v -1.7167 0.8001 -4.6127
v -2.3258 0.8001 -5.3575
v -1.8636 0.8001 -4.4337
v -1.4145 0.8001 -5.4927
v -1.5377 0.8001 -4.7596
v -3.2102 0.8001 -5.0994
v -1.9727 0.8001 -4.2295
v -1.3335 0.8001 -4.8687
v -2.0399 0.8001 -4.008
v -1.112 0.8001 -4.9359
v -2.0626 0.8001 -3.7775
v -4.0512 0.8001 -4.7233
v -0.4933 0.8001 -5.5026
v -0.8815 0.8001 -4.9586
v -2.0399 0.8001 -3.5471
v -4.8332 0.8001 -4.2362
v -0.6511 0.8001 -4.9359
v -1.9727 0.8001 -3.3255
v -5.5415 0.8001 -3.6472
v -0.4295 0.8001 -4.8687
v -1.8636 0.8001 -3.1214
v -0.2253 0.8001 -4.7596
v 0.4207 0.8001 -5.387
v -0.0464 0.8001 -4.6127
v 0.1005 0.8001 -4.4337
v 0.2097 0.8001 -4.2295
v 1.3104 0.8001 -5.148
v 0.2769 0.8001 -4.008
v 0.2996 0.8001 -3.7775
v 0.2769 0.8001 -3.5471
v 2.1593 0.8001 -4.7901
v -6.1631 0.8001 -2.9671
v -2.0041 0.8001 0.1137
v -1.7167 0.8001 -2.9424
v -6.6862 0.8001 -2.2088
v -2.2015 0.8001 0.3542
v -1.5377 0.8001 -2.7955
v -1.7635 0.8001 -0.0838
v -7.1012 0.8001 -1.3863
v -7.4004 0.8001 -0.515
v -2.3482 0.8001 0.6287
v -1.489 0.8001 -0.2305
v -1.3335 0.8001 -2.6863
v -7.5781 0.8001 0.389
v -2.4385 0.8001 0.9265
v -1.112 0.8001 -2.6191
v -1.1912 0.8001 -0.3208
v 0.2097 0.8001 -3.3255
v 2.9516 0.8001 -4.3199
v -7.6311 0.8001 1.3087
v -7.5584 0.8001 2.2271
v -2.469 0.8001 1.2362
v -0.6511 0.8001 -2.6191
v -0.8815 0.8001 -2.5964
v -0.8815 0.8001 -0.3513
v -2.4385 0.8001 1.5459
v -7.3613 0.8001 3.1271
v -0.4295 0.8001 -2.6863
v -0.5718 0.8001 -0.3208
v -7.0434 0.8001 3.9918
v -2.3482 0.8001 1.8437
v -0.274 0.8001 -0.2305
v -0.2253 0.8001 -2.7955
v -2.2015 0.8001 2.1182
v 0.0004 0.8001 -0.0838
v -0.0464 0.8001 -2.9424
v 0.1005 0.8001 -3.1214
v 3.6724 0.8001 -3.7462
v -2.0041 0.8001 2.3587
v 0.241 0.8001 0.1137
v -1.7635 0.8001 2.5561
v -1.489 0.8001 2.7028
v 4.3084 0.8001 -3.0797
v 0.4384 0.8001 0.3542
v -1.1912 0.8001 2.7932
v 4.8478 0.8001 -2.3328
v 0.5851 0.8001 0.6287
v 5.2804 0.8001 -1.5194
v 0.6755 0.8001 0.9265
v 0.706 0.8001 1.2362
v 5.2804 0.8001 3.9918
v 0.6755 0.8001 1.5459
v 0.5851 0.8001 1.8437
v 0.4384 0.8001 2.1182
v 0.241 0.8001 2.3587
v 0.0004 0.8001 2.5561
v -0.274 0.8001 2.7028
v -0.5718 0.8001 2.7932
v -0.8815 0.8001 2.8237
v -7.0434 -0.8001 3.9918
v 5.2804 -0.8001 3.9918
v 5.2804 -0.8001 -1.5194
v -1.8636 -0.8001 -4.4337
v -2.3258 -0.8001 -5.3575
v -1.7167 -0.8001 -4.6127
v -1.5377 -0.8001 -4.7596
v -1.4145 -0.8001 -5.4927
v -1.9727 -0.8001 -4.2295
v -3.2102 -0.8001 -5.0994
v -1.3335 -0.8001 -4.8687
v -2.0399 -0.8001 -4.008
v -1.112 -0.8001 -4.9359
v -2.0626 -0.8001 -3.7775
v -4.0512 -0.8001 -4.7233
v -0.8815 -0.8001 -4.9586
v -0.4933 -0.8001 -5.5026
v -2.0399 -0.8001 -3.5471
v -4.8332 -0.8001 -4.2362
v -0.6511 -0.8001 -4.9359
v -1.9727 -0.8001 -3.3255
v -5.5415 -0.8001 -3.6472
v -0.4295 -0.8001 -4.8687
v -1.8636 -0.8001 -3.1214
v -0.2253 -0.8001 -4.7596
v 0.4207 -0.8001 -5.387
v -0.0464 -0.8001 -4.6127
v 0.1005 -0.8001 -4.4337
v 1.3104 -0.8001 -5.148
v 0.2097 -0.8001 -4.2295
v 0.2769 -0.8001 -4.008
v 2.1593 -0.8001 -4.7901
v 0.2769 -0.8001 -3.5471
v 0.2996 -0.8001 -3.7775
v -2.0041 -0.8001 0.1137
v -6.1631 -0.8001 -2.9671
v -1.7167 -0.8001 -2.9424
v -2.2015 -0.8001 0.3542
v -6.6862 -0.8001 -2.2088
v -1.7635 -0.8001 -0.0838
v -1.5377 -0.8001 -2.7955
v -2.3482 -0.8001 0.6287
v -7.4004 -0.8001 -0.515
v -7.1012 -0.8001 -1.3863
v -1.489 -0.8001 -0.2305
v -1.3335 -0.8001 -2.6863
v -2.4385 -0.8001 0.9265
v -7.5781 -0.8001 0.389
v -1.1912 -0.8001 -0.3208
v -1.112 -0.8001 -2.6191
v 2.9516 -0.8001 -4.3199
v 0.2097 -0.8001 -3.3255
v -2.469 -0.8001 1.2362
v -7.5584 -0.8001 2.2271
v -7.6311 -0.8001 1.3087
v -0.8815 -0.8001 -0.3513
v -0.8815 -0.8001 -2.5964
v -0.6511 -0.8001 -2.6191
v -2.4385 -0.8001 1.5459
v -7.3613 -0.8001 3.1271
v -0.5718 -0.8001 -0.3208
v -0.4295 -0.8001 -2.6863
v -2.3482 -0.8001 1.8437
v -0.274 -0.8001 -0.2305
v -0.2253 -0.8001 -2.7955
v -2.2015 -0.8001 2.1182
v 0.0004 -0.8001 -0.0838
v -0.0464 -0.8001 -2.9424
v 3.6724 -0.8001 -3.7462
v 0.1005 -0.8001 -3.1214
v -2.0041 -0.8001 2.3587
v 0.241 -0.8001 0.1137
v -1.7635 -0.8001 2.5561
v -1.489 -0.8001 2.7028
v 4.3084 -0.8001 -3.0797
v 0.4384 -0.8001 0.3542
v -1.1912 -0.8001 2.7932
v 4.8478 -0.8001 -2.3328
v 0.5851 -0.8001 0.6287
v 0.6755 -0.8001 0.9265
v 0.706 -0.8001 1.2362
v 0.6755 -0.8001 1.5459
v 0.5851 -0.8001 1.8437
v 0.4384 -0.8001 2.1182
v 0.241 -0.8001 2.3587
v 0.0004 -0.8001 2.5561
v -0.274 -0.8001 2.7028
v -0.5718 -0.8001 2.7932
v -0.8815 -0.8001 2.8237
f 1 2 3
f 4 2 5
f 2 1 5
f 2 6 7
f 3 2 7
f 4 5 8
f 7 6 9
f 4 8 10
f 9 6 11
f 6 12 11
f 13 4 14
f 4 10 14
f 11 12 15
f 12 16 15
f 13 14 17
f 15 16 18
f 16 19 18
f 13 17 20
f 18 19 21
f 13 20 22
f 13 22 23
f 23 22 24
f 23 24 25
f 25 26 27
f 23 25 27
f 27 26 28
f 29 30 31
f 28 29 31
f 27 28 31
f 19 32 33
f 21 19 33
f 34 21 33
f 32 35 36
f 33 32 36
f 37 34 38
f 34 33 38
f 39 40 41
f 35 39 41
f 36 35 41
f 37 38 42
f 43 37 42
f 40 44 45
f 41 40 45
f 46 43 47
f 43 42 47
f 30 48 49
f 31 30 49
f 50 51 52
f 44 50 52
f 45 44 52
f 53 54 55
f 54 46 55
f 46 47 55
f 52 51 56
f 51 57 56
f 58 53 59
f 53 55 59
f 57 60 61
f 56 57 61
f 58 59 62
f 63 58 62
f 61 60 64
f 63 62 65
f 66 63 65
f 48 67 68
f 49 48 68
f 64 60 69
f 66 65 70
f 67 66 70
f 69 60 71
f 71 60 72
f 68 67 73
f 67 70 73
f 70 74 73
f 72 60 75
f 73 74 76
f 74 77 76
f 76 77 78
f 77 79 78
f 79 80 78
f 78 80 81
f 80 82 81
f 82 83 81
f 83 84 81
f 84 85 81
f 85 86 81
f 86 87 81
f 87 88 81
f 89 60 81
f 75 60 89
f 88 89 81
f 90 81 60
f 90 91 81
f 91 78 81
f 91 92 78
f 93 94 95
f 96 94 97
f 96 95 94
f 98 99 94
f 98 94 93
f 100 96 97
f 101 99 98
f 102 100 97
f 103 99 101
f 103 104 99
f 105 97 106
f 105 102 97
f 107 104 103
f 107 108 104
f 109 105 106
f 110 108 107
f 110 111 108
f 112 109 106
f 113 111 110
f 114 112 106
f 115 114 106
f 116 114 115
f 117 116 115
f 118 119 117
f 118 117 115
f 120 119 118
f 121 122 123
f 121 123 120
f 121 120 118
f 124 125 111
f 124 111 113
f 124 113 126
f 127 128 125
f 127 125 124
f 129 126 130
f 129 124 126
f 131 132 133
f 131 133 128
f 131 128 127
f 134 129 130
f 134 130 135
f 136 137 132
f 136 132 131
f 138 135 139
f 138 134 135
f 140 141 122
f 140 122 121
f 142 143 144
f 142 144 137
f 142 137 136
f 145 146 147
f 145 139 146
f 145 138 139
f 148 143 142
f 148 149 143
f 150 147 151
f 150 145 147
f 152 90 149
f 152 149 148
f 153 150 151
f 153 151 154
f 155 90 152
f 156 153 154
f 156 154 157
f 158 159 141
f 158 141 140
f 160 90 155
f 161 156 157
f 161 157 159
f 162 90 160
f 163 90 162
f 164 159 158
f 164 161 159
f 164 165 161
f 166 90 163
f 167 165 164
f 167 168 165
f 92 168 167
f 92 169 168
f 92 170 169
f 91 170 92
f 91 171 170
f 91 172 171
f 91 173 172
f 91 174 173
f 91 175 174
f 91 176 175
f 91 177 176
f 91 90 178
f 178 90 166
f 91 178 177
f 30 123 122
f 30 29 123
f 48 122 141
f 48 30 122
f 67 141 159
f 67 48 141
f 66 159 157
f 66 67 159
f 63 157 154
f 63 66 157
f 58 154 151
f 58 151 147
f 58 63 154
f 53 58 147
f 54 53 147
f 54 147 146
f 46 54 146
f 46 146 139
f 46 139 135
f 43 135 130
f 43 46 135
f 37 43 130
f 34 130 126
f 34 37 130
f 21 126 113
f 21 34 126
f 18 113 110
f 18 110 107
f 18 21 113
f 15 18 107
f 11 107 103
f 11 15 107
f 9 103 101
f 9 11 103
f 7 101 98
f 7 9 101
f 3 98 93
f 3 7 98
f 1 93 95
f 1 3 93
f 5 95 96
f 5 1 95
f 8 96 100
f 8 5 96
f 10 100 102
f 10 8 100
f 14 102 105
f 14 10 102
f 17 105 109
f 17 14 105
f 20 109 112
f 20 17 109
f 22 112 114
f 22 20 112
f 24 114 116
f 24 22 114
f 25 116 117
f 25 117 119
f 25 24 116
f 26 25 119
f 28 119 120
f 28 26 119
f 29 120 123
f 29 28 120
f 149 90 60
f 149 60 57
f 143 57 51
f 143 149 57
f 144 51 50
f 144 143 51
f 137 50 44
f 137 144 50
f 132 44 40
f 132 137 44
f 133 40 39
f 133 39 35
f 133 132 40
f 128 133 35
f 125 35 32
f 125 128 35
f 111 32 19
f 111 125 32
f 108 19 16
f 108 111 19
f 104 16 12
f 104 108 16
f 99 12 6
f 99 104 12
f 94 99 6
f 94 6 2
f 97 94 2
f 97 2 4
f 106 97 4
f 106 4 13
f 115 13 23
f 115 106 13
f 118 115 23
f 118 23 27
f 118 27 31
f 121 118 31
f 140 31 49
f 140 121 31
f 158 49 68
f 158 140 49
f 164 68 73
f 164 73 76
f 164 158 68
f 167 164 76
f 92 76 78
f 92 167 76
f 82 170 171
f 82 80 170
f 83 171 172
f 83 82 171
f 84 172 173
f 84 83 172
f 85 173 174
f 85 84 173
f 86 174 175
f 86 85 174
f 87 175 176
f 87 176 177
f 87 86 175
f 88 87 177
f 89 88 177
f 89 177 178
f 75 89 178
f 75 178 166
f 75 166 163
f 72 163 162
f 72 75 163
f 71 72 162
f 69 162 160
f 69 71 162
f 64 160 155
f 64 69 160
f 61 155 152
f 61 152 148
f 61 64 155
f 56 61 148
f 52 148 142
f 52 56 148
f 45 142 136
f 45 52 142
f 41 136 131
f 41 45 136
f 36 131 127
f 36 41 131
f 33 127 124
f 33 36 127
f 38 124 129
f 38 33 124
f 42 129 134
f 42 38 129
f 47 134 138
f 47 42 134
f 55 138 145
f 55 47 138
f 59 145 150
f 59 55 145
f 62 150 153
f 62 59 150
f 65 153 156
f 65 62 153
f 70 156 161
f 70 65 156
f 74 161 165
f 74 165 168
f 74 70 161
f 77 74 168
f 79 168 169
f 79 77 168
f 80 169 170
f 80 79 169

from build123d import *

# Parameters (mm, degrees)
F0_R     = 1.1811
F0_R_2   = 1.5875
F1_DEPTH = 0.8001


with BuildPart() as f1:
    # F0 (on Front) → F1 (new body, symmetric)
    with BuildSketch(Plane.XZ):
        with BuildLine():
            Line((5.280381, 3.991776), (-7.04344, 3.991776))
            ThreePointArc((-7.04344, 3.991776), (-3.637121, -4.925726), (5.280381, -1.519407))
            Line((5.280381, -1.519407), (5.280381, 3.991776))
        make_face()
        with Locations((-0.881529, -3.777536)):
            Circle(F0_R, mode=Mode.SUBTRACT)
        with Locations((-0.881529, 1.236185)):
            Circle(F0_R_2, mode=Mode.SUBTRACT)
    extrude(amount=F1_DEPTH, both=True)


solid = f1.part
